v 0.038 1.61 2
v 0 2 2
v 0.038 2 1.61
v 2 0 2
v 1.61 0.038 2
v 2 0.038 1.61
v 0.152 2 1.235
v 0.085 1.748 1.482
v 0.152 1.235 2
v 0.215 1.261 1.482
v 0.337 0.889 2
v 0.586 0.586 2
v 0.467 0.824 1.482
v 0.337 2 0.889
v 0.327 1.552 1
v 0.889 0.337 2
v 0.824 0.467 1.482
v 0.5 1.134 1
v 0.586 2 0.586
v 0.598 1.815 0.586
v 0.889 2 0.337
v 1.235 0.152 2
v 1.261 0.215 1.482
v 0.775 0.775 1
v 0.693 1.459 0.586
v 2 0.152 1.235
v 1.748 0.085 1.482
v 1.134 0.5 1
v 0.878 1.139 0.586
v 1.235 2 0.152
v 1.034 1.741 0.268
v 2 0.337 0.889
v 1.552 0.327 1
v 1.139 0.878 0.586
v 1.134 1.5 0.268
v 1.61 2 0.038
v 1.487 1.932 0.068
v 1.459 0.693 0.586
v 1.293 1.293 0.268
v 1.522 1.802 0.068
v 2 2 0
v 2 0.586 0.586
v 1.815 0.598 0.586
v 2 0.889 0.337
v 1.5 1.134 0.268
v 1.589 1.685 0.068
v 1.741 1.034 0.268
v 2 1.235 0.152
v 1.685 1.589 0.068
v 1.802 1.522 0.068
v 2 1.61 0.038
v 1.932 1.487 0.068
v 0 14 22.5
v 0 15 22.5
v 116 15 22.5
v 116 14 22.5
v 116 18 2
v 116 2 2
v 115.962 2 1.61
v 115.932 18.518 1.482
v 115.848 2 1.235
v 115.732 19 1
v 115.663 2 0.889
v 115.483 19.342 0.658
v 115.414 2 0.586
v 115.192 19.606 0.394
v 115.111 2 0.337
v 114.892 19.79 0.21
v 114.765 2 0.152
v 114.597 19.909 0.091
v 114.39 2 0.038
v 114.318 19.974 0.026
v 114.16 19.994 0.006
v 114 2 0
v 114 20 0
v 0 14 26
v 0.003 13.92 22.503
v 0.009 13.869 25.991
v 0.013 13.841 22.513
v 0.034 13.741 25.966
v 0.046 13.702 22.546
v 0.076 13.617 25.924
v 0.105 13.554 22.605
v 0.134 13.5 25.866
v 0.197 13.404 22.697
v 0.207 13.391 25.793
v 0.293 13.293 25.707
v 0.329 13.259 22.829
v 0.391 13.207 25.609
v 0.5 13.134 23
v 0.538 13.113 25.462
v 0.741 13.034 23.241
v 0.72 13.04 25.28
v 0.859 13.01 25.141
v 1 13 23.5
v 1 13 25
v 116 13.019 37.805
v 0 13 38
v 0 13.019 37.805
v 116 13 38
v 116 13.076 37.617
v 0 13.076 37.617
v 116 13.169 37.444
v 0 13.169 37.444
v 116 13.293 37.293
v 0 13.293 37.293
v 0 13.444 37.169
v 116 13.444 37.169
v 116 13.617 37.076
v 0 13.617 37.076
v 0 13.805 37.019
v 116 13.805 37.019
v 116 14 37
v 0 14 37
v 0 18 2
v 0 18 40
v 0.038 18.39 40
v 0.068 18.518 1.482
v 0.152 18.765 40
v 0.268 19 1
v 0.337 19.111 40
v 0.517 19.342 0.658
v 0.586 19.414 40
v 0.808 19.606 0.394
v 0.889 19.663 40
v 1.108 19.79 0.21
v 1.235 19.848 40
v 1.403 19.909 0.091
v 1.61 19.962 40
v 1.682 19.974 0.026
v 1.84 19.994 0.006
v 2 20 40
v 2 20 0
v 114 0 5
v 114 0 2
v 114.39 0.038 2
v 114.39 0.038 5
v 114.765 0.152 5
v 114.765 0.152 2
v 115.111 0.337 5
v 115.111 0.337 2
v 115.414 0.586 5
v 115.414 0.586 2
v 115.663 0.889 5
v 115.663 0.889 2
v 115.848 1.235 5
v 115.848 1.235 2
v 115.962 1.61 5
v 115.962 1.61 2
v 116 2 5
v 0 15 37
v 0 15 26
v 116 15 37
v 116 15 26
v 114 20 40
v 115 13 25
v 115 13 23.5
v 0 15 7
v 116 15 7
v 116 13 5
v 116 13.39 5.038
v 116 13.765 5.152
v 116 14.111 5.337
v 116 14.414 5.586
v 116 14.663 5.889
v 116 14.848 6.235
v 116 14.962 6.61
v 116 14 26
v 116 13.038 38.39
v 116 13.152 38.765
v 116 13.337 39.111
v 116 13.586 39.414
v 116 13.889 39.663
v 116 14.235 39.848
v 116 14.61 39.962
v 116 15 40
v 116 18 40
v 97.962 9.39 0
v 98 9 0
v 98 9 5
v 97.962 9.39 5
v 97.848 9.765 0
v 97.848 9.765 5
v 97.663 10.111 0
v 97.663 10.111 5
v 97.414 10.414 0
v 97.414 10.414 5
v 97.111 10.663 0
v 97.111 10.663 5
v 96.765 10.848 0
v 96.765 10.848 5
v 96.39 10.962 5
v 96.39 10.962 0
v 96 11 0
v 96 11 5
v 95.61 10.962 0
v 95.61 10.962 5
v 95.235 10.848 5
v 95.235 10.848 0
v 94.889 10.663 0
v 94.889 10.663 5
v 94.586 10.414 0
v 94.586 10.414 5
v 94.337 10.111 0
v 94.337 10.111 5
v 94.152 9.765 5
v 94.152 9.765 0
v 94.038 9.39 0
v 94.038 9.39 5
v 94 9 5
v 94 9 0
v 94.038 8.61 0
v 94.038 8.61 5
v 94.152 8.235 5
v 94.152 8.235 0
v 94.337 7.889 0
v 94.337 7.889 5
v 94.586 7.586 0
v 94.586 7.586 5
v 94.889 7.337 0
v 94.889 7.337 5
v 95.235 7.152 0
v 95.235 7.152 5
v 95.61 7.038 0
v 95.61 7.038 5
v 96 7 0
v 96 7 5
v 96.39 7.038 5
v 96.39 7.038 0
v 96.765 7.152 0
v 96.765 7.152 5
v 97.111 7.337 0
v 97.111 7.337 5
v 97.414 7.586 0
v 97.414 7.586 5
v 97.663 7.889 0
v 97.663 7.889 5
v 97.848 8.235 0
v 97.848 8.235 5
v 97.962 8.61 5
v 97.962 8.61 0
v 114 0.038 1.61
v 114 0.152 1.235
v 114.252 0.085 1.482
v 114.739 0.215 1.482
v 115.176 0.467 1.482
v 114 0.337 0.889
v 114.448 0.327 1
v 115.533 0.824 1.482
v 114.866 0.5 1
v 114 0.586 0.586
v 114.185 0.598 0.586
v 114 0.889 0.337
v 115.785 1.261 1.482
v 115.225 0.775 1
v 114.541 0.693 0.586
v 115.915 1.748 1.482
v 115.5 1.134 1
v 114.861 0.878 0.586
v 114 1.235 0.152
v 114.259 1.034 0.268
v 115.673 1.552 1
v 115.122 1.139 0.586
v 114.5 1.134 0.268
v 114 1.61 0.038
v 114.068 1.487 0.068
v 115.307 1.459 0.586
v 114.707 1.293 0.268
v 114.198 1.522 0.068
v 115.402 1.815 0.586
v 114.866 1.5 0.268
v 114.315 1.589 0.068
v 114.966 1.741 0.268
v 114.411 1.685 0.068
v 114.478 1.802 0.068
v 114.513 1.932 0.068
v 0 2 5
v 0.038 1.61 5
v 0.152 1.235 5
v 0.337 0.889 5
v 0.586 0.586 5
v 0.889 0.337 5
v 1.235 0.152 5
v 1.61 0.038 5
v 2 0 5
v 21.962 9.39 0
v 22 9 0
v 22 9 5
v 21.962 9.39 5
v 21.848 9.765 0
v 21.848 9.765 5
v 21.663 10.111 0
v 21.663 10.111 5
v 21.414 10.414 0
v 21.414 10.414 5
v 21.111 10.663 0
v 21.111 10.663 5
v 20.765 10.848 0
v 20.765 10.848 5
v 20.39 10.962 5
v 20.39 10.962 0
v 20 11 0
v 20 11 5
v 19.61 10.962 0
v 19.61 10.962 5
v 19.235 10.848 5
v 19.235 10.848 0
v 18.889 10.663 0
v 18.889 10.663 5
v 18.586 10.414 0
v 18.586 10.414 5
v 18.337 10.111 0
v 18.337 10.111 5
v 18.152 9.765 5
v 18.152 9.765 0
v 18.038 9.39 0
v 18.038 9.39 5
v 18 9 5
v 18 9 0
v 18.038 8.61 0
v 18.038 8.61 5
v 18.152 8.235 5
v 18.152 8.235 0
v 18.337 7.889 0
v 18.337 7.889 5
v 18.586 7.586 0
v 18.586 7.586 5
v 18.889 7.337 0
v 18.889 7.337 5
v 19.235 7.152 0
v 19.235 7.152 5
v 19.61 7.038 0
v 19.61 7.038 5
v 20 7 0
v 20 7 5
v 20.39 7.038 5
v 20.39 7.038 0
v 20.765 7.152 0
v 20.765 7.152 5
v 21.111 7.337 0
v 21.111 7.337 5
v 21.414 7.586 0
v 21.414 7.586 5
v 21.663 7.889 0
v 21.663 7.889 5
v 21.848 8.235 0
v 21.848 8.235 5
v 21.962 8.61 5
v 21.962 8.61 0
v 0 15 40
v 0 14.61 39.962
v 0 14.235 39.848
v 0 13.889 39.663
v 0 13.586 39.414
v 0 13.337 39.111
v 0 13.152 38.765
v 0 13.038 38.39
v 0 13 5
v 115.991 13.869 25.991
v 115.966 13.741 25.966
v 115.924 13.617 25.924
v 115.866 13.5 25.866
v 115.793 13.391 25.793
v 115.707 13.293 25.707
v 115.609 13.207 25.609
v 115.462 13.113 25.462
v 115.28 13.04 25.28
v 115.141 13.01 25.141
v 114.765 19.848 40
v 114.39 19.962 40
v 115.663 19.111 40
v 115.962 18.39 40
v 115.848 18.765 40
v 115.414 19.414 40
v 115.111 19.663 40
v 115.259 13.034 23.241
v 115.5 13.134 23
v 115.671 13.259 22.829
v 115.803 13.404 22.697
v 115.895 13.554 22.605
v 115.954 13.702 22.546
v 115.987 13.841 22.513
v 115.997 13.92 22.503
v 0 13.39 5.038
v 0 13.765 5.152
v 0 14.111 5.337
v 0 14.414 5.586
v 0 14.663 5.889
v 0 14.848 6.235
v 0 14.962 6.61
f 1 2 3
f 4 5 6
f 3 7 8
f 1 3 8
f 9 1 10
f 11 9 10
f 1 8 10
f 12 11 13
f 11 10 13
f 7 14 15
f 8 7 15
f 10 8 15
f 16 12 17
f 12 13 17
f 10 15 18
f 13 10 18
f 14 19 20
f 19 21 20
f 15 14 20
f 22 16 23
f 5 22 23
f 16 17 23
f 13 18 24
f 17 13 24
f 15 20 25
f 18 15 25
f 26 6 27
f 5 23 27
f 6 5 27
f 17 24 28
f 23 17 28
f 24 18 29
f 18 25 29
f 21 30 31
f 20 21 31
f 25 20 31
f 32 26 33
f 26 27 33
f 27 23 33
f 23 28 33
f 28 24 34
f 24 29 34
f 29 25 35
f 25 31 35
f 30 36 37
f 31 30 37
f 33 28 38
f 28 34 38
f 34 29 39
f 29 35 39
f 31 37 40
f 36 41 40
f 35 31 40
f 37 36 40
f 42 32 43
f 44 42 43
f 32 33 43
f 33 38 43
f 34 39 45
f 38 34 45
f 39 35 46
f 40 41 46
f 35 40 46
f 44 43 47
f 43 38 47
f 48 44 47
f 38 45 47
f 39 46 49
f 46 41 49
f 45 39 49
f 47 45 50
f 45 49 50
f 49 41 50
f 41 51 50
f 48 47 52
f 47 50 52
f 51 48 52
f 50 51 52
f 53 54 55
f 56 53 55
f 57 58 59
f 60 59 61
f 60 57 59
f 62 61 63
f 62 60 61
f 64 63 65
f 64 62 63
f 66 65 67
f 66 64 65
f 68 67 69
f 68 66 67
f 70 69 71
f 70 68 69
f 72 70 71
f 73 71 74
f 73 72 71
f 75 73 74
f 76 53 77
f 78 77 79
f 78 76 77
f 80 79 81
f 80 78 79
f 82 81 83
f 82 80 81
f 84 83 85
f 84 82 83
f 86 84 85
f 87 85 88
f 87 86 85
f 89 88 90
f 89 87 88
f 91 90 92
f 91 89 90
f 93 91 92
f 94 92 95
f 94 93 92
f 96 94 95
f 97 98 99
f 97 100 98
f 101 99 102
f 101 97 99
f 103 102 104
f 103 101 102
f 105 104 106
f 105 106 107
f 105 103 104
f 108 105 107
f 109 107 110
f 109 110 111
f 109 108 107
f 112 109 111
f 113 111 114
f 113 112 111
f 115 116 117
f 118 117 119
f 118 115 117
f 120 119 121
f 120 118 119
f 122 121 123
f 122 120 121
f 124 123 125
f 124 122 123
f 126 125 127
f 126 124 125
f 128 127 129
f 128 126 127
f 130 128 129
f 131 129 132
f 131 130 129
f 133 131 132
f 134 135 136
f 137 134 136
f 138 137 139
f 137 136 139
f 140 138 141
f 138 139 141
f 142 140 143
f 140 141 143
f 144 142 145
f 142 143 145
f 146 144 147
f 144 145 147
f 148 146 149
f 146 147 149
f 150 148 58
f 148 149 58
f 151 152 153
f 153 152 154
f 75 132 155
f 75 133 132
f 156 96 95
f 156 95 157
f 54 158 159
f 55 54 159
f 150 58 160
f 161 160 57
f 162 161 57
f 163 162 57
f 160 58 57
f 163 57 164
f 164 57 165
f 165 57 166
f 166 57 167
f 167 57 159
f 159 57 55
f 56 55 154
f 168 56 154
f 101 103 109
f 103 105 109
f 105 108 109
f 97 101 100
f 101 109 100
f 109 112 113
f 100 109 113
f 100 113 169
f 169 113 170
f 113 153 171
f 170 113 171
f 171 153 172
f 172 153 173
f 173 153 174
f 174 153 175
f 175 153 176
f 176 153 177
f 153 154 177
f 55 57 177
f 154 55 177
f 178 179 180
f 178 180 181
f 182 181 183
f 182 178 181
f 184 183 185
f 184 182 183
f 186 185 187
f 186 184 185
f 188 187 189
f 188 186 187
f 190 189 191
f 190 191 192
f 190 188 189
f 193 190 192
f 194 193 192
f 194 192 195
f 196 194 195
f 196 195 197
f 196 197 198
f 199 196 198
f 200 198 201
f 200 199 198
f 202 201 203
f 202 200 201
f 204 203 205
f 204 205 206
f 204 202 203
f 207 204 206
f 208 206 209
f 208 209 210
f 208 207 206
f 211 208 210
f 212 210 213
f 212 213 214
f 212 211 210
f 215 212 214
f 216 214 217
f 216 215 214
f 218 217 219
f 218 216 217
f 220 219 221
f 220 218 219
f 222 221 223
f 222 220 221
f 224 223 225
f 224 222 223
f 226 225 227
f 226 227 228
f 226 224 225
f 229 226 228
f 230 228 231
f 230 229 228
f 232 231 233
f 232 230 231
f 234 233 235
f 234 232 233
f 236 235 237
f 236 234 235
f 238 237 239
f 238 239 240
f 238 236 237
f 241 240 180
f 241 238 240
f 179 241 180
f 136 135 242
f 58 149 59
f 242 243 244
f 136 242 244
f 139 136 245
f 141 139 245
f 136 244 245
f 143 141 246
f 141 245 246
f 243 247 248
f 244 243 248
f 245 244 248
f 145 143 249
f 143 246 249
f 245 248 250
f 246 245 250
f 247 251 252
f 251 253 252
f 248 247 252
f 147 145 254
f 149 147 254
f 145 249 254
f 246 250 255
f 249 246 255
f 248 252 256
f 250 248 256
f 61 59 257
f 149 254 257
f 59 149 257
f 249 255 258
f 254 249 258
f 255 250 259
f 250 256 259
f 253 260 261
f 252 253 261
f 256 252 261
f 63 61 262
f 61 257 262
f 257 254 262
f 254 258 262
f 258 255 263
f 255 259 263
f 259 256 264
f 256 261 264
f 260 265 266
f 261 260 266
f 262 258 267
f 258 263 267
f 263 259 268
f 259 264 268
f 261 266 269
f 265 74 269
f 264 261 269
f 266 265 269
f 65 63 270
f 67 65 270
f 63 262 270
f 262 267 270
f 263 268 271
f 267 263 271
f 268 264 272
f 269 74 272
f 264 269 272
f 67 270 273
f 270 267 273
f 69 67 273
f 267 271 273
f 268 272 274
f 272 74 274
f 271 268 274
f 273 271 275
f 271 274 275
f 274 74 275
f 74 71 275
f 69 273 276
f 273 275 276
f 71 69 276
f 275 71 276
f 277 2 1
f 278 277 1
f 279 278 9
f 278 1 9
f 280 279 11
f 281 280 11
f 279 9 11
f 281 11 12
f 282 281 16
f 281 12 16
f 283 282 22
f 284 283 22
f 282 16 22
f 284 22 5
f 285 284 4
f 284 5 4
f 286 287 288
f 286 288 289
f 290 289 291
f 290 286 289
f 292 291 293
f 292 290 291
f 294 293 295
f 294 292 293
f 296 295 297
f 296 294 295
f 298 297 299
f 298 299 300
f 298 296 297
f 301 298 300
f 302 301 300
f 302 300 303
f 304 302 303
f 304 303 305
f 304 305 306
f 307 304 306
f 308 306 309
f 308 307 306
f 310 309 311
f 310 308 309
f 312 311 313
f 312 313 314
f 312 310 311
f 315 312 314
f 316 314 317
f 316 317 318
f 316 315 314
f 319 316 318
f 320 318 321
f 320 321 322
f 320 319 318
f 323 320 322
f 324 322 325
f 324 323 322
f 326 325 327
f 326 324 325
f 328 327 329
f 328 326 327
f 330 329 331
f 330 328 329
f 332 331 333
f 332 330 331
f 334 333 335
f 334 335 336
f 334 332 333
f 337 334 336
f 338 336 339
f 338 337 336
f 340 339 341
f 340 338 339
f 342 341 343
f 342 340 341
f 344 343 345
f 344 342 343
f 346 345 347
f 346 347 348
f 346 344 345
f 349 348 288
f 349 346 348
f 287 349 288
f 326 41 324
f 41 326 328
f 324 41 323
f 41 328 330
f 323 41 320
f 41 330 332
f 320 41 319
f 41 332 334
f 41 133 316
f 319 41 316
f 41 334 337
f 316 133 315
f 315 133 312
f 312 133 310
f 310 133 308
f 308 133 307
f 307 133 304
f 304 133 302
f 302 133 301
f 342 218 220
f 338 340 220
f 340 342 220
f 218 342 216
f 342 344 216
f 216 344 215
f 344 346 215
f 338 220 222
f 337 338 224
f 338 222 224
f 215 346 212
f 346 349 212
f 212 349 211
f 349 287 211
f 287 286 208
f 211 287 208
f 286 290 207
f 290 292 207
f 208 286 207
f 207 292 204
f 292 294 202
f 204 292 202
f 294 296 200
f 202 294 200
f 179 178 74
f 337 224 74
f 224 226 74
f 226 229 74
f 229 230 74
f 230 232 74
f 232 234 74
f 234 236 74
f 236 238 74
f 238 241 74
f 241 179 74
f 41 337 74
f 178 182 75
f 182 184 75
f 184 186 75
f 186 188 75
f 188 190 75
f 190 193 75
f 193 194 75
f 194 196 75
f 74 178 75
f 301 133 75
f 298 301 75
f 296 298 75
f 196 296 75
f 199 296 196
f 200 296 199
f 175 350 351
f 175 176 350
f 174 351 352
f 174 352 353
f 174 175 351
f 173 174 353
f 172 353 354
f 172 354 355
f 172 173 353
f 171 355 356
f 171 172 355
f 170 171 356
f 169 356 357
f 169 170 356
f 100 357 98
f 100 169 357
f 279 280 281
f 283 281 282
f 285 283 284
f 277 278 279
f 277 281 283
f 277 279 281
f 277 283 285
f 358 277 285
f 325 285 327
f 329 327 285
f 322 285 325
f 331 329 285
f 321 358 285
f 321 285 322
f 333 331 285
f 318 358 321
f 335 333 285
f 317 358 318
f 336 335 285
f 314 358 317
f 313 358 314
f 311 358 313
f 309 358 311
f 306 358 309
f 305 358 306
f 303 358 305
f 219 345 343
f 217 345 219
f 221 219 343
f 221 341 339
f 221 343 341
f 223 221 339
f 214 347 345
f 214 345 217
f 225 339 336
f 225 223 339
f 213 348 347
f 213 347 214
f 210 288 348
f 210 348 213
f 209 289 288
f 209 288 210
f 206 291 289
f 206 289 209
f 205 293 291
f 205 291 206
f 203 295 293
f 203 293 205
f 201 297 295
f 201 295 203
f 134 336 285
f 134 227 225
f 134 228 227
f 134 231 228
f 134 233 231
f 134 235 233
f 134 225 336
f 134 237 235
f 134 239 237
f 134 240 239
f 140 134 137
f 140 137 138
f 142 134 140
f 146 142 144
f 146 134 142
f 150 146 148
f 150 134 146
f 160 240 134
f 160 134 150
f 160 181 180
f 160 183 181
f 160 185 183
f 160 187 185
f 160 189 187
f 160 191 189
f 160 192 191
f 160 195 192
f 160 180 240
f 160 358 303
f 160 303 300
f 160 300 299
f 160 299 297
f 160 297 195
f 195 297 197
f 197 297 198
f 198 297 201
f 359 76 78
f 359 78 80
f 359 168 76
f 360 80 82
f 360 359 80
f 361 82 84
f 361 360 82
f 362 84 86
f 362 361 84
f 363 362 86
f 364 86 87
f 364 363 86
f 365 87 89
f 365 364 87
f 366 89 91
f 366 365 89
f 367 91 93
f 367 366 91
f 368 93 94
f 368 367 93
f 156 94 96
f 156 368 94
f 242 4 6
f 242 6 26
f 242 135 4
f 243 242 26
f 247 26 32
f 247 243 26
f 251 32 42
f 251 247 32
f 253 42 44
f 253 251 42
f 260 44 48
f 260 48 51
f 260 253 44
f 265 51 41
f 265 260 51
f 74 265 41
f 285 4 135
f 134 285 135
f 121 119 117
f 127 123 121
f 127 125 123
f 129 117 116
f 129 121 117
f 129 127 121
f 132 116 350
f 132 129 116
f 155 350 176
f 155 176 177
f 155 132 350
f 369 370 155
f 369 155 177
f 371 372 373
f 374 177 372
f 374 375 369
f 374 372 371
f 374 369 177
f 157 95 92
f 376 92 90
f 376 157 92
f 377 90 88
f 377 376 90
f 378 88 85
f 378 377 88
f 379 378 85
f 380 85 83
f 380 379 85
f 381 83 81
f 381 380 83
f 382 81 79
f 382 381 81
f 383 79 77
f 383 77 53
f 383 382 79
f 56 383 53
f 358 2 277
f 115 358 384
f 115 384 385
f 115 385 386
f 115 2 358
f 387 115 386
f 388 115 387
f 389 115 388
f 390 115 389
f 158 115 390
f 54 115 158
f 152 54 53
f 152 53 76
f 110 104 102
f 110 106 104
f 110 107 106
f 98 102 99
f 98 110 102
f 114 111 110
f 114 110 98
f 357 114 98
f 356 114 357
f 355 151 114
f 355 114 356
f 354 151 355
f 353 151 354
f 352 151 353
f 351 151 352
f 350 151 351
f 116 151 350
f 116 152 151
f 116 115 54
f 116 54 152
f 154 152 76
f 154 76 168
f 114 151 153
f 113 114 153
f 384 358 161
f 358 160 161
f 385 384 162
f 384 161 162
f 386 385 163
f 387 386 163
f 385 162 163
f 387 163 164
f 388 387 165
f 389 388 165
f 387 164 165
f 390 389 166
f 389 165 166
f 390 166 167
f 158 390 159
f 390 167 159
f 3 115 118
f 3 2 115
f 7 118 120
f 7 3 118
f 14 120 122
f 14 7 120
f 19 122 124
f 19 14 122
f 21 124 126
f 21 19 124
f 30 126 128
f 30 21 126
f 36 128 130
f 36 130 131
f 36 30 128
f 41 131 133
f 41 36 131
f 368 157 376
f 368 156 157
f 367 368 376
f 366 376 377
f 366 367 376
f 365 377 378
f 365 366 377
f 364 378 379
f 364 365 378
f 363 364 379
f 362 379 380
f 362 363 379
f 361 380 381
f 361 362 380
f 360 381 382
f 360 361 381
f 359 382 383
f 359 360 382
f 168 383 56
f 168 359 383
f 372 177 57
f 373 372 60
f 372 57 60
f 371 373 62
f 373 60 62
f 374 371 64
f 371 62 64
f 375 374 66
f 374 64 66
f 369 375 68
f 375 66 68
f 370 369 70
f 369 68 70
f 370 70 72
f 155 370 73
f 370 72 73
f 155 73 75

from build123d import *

# Parameters (mm, degrees)
SKETCH1_R           = 2
BOSS_EXTRUDE1_DEPTH = 5
SKETCH2_W           = 116
SKETCH2_H           = 5
BOSS_EXTRUDE2_DEPTH = 35
SKETCH3_W           = 116
SKETCH3_H           = 3
SKETCH3_H_2         = 3.5
BOSS_EXTRUDE3_DEPTH = 2
FILLET1_R           = 2
FILLET2_R           = 1
FILLET3_R           = 2


with BuildPart() as part:
    # Sketch1 → Boss-Extrude1 (new body)
    with BuildSketch(Plane.XY):
        with BuildLine():
            Line((2, 0), (114, 0))
            ThreePointArc((114, 0), (115.414213562, 0.585786438), (116, 2))
            Line((116, 2), (116, 20))
            Line((116, 20), (0, 20))
            Line((0, 20), (0, 2))
            ThreePointArc((0, 2), (0.585786438, 0.585786438), (2, 0))
        make_face()
        with Locations((20, 9)):
            Circle(SKETCH1_R, mode=Mode.SUBTRACT)
        with Locations((96, 9)):
            Circle(SKETCH1_R, mode=Mode.SUBTRACT)
    extrude(amount=BOSS_EXTRUDE1_DEPTH)

    # Sketch2 → Boss-Extrude2 (add)
    with BuildSketch(Plane.XY.offset(5)):
        with Locations((58, 17.5)):
            Rectangle(SKETCH2_W, SKETCH2_H)
    extrude(amount=BOSS_EXTRUDE2_DEPTH)

    # Sketch3 → Boss-Extrude3 (add)
    with BuildSketch(Plane.XZ.offset(-15)):
        with Locations((58, 38.5)):
            Rectangle(SKETCH3_W, SKETCH3_H)
        with Locations((58, 24.25)):
            Rectangle(SKETCH3_W, SKETCH3_H_2)
    extrude(amount=BOSS_EXTRUDE3_DEPTH)

    # Fillet1
    fillet1_edges = [part.edges().sort_by_distance(p)[0] for p in [
        (0, 20, 20),
        (116, 20, 20),
        (58, 13, 40),
        (115.414213562, 0.585786438, 0),
        (58, 0, 0),
        (0.585786438, 0.585786438, 0),
        (0, 11, 0),
        (116, 11, 0),
    ]]
    fillet(fillet1_edges, radius=FILLET1_R)

    # Fillet2
    fillet2_edges = [part.edges().sort_by_distance(p)[0] for p in [
        (58, 13, 26),
        (116, 13, 24.25),
        (58, 13, 22.5),
        (0, 13, 24.25),
        (58, 13, 37),
    ]]
    fillet(fillet2_edges, radius=FILLET2_R - 0.0001)  # a hair under: the kernel refuses the full size

    # Fillet3
    fillet3_edges = [part.edges().sort_by_distance(p)[0] for p in [
        (58, 15, 5),
    ]]
    fillet(fillet3_edges, radius=FILLET3_R)


solid = part.part
